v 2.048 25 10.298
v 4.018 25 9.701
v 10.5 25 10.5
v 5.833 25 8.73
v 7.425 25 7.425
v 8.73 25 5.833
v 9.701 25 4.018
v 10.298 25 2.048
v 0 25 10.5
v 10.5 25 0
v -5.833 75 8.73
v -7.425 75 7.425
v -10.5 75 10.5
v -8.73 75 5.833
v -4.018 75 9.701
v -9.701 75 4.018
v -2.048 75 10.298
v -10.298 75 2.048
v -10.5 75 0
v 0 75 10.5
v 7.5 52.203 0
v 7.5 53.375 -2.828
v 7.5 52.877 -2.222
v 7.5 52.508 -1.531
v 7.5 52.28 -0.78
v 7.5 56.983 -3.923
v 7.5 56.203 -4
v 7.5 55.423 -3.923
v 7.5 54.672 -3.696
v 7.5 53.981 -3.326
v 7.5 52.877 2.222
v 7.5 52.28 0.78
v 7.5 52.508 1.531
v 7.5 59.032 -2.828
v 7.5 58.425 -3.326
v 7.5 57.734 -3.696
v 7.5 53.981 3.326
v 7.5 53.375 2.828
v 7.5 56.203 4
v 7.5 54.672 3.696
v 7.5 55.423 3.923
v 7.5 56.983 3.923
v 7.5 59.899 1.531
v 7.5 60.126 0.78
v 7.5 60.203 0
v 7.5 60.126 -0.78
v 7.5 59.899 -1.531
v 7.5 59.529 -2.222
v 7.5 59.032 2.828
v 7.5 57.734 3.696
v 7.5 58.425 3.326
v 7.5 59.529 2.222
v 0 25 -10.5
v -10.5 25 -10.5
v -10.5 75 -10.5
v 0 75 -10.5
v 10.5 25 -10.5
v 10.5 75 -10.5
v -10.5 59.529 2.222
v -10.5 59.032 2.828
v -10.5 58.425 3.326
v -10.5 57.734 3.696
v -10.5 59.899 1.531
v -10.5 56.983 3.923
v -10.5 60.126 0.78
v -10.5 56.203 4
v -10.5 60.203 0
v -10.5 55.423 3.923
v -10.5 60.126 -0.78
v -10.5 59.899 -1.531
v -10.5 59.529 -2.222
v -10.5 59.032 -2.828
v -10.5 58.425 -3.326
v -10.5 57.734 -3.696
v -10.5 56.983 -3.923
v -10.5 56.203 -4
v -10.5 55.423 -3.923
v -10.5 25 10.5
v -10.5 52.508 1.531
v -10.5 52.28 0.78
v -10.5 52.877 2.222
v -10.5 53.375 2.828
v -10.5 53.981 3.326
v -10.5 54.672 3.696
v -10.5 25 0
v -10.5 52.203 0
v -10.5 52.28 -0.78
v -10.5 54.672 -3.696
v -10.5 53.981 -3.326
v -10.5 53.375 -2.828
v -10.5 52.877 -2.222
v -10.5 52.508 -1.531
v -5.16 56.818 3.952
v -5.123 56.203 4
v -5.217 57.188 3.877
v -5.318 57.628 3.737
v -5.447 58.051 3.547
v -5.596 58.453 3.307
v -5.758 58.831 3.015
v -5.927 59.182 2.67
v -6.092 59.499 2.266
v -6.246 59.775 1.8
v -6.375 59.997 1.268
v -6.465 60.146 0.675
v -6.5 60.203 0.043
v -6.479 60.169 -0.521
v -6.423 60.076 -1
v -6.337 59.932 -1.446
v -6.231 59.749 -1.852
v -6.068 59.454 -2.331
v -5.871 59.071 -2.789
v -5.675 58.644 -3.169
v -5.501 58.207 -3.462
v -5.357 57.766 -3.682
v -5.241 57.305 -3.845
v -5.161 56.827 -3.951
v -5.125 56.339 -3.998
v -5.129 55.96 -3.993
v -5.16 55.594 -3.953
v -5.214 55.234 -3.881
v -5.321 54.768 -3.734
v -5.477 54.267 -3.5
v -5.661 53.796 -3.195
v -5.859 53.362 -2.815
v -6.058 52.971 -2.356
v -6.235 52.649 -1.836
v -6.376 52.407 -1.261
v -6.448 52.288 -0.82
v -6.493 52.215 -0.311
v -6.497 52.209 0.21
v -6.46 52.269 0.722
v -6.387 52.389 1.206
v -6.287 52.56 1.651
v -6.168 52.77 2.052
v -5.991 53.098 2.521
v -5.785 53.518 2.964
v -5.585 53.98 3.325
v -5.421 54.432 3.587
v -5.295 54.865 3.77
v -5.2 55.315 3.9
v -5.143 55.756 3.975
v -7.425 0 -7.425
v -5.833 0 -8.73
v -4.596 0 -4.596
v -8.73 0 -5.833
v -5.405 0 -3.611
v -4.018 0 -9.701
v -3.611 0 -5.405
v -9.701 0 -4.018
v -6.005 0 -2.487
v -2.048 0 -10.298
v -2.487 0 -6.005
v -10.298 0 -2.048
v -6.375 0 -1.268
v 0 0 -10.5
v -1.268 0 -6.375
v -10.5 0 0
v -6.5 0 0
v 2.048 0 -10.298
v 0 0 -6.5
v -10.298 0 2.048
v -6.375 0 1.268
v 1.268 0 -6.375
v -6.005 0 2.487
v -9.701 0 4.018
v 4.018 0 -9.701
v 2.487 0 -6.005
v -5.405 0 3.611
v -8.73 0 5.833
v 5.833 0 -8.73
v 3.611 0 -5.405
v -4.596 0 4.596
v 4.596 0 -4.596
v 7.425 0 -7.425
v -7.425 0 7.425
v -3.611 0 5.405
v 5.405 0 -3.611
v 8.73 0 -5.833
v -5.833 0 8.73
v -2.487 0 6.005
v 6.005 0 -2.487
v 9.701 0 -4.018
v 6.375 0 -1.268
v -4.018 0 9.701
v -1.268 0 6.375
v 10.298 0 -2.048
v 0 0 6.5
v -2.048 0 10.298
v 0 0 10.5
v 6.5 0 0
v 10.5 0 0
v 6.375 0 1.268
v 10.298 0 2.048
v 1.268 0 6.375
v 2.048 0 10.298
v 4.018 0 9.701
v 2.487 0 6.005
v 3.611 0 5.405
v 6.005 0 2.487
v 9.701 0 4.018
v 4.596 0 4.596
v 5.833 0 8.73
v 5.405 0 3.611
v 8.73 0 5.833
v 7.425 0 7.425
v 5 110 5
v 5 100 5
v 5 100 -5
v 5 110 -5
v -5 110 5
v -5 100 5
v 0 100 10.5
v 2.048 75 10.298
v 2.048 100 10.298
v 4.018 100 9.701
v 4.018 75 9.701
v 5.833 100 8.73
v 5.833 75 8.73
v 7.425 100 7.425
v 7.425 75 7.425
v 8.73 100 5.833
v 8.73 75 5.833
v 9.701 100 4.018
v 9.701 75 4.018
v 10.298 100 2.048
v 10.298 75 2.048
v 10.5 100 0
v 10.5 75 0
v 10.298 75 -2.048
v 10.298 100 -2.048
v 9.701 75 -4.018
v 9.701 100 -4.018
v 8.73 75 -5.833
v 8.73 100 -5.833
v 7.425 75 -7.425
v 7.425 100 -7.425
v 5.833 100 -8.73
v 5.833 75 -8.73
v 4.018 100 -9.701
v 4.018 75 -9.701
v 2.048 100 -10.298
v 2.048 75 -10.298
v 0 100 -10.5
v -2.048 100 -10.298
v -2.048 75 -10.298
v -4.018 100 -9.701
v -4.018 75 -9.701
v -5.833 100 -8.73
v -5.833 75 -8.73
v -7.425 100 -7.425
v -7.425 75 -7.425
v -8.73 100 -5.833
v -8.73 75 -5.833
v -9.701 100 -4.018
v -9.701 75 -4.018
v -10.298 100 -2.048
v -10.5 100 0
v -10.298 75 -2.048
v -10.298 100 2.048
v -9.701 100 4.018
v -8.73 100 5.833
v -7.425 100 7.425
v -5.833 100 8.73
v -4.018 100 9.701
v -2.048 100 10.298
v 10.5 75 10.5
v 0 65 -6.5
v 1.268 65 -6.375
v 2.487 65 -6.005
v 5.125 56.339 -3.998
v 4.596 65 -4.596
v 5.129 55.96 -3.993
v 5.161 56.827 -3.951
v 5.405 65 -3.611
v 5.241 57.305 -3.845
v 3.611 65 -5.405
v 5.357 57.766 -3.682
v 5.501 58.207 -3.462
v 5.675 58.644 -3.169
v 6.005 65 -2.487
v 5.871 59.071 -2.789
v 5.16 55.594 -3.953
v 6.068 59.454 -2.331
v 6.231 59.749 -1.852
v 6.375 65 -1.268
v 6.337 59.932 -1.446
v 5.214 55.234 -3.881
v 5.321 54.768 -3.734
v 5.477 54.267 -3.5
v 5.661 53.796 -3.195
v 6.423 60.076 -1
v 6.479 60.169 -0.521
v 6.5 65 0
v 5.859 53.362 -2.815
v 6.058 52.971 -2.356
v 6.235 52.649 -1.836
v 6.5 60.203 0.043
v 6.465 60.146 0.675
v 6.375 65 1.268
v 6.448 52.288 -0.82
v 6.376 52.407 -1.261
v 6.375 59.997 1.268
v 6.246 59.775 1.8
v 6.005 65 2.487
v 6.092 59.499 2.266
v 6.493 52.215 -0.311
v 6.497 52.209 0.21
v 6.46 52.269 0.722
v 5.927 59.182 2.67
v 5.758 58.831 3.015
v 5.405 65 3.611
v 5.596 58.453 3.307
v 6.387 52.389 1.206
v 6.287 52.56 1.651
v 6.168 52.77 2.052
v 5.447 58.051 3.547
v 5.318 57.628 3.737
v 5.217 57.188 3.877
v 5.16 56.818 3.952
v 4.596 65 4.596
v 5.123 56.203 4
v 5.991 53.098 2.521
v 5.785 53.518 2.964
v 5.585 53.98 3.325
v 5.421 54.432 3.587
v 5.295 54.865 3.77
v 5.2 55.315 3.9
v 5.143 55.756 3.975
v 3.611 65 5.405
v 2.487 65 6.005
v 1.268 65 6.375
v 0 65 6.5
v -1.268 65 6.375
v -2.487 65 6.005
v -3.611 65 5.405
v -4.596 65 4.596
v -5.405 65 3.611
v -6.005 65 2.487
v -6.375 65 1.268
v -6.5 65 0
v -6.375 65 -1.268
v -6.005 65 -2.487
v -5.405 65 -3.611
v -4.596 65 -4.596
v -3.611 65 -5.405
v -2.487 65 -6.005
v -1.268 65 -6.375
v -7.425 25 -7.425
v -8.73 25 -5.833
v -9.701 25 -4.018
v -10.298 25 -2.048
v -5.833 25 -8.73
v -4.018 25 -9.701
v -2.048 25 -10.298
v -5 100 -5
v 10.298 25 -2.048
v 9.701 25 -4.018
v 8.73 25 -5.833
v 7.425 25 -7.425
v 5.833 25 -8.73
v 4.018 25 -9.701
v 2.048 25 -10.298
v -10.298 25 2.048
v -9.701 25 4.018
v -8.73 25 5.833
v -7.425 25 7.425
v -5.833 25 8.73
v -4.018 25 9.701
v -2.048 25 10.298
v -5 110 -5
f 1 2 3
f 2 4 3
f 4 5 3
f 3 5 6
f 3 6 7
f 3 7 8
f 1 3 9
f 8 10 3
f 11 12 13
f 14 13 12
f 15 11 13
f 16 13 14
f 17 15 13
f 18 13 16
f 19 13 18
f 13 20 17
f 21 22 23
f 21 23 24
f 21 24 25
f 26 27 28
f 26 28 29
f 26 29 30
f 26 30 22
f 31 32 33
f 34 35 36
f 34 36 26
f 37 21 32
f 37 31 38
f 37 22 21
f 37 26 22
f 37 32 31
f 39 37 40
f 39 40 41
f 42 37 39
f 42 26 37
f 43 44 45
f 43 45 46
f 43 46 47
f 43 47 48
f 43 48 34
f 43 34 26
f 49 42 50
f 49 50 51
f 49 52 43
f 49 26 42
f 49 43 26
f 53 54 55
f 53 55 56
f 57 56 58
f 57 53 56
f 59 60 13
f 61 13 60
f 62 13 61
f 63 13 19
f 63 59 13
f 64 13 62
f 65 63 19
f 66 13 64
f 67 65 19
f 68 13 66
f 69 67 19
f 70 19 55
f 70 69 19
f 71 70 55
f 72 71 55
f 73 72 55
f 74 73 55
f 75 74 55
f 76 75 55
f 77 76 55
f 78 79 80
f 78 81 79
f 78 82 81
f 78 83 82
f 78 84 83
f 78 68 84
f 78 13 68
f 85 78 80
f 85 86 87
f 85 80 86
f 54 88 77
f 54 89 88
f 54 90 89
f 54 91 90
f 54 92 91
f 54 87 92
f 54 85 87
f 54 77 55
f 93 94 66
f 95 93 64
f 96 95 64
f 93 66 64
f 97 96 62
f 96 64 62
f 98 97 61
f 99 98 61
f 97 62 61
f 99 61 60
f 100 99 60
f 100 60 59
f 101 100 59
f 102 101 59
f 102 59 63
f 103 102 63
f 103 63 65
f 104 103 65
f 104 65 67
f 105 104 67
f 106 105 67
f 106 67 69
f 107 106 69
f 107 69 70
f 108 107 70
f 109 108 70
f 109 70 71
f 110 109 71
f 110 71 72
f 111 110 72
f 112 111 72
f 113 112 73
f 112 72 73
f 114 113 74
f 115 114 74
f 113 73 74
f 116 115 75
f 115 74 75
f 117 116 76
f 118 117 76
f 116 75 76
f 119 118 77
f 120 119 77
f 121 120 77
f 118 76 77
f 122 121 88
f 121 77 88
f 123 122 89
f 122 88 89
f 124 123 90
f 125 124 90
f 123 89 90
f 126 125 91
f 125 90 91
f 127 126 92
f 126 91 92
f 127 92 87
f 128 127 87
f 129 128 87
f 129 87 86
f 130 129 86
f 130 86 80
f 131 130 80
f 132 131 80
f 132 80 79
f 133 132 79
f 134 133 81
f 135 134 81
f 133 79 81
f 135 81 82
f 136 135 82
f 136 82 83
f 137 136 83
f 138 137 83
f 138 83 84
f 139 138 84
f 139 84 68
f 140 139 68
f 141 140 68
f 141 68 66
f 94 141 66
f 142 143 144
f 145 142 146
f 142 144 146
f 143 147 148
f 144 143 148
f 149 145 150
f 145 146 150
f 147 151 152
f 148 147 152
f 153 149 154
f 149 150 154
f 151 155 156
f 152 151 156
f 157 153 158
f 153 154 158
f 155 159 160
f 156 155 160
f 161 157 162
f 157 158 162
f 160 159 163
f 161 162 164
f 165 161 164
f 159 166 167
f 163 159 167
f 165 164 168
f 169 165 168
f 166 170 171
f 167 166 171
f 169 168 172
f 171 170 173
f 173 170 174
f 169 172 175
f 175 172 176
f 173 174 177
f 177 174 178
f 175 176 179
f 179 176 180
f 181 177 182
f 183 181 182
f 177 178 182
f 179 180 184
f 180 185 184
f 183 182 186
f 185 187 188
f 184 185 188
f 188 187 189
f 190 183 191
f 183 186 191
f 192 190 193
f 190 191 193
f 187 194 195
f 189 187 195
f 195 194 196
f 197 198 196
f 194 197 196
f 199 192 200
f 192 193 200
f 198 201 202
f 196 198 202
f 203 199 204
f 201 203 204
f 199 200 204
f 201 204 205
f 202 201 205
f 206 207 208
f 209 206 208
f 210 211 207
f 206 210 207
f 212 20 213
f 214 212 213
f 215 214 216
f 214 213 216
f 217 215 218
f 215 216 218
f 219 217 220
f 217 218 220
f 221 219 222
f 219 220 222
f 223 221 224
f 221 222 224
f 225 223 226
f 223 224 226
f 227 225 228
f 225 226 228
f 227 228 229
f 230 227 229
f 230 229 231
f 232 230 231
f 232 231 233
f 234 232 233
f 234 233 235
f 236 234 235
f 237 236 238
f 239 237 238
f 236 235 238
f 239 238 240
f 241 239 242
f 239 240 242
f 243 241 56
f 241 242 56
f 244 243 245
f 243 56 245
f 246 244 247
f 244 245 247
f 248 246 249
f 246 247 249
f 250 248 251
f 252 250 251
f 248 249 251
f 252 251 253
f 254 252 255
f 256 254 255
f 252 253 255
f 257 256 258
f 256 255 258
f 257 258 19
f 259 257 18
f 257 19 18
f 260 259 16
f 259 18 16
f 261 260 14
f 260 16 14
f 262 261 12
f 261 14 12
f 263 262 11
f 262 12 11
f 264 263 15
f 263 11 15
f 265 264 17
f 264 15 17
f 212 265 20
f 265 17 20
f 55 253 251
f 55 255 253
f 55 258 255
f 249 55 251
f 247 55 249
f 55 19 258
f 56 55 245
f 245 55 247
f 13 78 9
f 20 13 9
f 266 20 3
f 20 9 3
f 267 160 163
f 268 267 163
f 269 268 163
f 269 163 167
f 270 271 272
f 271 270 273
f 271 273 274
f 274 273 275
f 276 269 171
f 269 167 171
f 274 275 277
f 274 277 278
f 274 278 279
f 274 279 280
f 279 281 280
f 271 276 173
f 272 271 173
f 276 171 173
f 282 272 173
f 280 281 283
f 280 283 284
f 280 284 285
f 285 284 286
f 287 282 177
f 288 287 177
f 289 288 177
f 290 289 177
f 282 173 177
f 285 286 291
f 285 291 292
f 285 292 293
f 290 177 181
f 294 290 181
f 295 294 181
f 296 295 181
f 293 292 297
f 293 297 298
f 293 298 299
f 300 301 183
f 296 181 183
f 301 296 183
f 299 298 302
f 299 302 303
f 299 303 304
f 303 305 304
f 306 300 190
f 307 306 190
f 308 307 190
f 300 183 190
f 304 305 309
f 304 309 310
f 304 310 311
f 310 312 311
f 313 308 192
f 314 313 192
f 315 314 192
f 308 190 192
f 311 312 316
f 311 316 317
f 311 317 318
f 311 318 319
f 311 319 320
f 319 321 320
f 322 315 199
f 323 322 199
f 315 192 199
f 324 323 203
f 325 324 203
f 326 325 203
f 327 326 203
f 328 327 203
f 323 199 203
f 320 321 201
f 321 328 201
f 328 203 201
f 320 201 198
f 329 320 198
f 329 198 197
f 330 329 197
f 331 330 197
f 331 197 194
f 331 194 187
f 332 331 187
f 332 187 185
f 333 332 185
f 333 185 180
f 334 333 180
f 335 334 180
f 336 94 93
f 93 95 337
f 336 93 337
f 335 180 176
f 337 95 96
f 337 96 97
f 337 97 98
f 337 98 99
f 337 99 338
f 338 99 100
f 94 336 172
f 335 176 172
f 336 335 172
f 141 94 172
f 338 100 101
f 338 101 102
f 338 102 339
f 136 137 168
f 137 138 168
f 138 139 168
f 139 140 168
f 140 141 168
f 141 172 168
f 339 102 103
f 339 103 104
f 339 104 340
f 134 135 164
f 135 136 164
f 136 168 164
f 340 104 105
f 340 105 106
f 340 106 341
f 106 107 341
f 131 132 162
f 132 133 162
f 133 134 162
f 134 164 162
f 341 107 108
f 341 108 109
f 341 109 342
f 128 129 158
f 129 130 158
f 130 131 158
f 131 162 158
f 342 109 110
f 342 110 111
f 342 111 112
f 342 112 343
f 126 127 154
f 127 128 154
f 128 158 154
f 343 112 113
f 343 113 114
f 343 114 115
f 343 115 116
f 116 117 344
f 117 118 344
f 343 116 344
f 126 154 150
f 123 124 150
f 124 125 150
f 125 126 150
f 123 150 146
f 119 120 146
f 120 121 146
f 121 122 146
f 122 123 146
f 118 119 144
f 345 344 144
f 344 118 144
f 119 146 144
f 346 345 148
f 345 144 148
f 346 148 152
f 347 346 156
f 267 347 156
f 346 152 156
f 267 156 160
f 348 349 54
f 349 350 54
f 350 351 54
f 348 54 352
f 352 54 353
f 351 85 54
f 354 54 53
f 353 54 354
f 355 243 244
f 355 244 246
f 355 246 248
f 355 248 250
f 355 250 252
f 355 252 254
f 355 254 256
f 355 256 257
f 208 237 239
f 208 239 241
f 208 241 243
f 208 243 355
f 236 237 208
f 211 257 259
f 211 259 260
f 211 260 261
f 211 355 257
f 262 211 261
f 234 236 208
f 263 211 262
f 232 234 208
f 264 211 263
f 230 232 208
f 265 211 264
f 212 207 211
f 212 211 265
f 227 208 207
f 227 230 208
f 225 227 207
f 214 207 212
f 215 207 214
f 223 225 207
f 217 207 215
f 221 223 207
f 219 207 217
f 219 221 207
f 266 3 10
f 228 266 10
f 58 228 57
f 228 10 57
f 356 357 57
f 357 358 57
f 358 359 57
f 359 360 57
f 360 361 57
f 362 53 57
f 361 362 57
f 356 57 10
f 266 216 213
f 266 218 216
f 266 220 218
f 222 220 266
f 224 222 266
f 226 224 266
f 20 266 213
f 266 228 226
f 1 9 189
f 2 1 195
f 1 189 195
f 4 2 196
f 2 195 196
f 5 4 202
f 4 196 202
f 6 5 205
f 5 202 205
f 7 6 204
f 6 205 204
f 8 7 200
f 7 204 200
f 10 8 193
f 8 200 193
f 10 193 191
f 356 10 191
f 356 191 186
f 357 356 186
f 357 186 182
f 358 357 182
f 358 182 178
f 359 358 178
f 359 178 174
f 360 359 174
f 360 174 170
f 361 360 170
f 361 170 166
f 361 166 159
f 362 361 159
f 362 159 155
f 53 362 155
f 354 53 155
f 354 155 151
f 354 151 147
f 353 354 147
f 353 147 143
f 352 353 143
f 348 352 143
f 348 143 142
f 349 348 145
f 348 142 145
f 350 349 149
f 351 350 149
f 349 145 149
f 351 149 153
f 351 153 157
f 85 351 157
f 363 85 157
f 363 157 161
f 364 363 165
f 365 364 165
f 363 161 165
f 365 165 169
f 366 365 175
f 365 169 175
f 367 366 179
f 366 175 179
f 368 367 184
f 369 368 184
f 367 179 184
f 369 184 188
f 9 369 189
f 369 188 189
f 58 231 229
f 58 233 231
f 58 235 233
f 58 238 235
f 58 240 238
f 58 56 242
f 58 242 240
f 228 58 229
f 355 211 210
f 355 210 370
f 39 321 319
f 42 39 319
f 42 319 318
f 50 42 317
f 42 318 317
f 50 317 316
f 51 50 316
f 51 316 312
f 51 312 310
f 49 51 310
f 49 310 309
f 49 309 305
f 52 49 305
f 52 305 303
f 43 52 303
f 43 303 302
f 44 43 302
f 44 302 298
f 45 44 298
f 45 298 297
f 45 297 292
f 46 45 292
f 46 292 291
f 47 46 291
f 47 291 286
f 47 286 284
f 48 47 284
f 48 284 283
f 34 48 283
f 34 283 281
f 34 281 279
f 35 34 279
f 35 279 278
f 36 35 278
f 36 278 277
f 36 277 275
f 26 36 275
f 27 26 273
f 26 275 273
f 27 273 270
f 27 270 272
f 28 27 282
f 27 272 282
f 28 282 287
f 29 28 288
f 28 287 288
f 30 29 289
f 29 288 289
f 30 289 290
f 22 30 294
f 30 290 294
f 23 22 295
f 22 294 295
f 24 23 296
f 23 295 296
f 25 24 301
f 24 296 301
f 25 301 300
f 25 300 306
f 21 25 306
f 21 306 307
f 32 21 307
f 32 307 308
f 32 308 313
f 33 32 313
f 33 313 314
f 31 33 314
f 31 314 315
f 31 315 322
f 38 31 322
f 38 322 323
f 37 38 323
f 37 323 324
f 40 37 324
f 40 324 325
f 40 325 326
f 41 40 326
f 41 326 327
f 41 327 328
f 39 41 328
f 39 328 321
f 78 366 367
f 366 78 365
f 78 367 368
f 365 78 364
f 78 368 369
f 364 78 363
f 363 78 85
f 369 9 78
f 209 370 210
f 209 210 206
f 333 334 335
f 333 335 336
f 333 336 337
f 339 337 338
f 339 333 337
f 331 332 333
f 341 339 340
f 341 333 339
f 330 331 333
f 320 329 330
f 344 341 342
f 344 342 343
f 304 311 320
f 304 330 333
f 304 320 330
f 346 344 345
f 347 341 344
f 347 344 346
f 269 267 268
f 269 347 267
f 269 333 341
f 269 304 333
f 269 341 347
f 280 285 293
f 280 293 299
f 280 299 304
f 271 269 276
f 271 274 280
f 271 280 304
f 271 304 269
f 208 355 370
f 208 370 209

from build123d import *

# Parameters (mm, degrees)
SKETCH2_R           = 10.5
BOSS_EXTRUDE1_DEPTH = 25
SKETCH3_W           = 21
SKETCH3_H           = 21
BOSS_EXTRUDE2_DEPTH = 50
SKETCH4_R           = 10.5
BOSS_EXTRUDE3_DEPTH = 25
SKETCH5_W           = 10
SKETCH5_H           = 10
BOSS_EXTRUDE4_DEPTH = 10
SKETCH6_R           = 4
CUT_EXTRUDE1_DEPTH  = 18
SKETCH7_R           = 6.5
CUT_EXTRUDE2_DEPTH  = 65


with BuildPart() as part:
    # Sketch2 → Boss-Extrude1 (new body)
    with BuildSketch(Plane(origin=(0, 0, 0), x_dir=(1, 0, 0), z_dir=(0, 1, 0))):
        with Locations(Location((0, 0, 0), (0, 0, 270))):
            Circle(SKETCH2_R)
    extrude(amount=BOSS_EXTRUDE1_DEPTH)

    # Sketch3 → Boss-Extrude2 (add)
    with BuildSketch(Plane(origin=(0, 25, 0), x_dir=(1, 0, 0), z_dir=(0, 1, 0))):
        Rectangle(SKETCH3_W, SKETCH3_H)
    extrude(amount=BOSS_EXTRUDE2_DEPTH)

    # Sketch4 → Boss-Extrude3 (add)
    with BuildSketch(Plane(origin=(0, 75, 0), x_dir=(1, 0, 0), z_dir=(0, 1, 0))):
        with Locations(Location((0, 0, 0), (0, 0, 270))):
            Circle(SKETCH4_R)
    extrude(amount=BOSS_EXTRUDE3_DEPTH)

    # Sketch5 → Boss-Extrude4 (add)
    with BuildSketch(Plane(origin=(0, 100, 0), x_dir=(1, 0, 0), z_dir=(0, 1, 0))):
        Rectangle(SKETCH5_W, SKETCH5_H)
    extrude(amount=BOSS_EXTRUDE4_DEPTH)

    # Sketch6 → Cut-Extrude1 (cut)
    with BuildSketch(Plane.ZY.offset(10.5)):
        with Locations((0, 56.203092856)):
            Circle(SKETCH6_R)
    extrude(amount=-CUT_EXTRUDE1_DEPTH, mode=Mode.SUBTRACT)

    # Sketch7 → Cut-Extrude2 (cut)
    with BuildSketch(Plane.XZ):
        with Locations(Location((0, 0, 0), (0, 0, 270))):
            Circle(SKETCH7_R)
    extrude(amount=-CUT_EXTRUDE2_DEPTH, mode=Mode.SUBTRACT)


solid = part.part
